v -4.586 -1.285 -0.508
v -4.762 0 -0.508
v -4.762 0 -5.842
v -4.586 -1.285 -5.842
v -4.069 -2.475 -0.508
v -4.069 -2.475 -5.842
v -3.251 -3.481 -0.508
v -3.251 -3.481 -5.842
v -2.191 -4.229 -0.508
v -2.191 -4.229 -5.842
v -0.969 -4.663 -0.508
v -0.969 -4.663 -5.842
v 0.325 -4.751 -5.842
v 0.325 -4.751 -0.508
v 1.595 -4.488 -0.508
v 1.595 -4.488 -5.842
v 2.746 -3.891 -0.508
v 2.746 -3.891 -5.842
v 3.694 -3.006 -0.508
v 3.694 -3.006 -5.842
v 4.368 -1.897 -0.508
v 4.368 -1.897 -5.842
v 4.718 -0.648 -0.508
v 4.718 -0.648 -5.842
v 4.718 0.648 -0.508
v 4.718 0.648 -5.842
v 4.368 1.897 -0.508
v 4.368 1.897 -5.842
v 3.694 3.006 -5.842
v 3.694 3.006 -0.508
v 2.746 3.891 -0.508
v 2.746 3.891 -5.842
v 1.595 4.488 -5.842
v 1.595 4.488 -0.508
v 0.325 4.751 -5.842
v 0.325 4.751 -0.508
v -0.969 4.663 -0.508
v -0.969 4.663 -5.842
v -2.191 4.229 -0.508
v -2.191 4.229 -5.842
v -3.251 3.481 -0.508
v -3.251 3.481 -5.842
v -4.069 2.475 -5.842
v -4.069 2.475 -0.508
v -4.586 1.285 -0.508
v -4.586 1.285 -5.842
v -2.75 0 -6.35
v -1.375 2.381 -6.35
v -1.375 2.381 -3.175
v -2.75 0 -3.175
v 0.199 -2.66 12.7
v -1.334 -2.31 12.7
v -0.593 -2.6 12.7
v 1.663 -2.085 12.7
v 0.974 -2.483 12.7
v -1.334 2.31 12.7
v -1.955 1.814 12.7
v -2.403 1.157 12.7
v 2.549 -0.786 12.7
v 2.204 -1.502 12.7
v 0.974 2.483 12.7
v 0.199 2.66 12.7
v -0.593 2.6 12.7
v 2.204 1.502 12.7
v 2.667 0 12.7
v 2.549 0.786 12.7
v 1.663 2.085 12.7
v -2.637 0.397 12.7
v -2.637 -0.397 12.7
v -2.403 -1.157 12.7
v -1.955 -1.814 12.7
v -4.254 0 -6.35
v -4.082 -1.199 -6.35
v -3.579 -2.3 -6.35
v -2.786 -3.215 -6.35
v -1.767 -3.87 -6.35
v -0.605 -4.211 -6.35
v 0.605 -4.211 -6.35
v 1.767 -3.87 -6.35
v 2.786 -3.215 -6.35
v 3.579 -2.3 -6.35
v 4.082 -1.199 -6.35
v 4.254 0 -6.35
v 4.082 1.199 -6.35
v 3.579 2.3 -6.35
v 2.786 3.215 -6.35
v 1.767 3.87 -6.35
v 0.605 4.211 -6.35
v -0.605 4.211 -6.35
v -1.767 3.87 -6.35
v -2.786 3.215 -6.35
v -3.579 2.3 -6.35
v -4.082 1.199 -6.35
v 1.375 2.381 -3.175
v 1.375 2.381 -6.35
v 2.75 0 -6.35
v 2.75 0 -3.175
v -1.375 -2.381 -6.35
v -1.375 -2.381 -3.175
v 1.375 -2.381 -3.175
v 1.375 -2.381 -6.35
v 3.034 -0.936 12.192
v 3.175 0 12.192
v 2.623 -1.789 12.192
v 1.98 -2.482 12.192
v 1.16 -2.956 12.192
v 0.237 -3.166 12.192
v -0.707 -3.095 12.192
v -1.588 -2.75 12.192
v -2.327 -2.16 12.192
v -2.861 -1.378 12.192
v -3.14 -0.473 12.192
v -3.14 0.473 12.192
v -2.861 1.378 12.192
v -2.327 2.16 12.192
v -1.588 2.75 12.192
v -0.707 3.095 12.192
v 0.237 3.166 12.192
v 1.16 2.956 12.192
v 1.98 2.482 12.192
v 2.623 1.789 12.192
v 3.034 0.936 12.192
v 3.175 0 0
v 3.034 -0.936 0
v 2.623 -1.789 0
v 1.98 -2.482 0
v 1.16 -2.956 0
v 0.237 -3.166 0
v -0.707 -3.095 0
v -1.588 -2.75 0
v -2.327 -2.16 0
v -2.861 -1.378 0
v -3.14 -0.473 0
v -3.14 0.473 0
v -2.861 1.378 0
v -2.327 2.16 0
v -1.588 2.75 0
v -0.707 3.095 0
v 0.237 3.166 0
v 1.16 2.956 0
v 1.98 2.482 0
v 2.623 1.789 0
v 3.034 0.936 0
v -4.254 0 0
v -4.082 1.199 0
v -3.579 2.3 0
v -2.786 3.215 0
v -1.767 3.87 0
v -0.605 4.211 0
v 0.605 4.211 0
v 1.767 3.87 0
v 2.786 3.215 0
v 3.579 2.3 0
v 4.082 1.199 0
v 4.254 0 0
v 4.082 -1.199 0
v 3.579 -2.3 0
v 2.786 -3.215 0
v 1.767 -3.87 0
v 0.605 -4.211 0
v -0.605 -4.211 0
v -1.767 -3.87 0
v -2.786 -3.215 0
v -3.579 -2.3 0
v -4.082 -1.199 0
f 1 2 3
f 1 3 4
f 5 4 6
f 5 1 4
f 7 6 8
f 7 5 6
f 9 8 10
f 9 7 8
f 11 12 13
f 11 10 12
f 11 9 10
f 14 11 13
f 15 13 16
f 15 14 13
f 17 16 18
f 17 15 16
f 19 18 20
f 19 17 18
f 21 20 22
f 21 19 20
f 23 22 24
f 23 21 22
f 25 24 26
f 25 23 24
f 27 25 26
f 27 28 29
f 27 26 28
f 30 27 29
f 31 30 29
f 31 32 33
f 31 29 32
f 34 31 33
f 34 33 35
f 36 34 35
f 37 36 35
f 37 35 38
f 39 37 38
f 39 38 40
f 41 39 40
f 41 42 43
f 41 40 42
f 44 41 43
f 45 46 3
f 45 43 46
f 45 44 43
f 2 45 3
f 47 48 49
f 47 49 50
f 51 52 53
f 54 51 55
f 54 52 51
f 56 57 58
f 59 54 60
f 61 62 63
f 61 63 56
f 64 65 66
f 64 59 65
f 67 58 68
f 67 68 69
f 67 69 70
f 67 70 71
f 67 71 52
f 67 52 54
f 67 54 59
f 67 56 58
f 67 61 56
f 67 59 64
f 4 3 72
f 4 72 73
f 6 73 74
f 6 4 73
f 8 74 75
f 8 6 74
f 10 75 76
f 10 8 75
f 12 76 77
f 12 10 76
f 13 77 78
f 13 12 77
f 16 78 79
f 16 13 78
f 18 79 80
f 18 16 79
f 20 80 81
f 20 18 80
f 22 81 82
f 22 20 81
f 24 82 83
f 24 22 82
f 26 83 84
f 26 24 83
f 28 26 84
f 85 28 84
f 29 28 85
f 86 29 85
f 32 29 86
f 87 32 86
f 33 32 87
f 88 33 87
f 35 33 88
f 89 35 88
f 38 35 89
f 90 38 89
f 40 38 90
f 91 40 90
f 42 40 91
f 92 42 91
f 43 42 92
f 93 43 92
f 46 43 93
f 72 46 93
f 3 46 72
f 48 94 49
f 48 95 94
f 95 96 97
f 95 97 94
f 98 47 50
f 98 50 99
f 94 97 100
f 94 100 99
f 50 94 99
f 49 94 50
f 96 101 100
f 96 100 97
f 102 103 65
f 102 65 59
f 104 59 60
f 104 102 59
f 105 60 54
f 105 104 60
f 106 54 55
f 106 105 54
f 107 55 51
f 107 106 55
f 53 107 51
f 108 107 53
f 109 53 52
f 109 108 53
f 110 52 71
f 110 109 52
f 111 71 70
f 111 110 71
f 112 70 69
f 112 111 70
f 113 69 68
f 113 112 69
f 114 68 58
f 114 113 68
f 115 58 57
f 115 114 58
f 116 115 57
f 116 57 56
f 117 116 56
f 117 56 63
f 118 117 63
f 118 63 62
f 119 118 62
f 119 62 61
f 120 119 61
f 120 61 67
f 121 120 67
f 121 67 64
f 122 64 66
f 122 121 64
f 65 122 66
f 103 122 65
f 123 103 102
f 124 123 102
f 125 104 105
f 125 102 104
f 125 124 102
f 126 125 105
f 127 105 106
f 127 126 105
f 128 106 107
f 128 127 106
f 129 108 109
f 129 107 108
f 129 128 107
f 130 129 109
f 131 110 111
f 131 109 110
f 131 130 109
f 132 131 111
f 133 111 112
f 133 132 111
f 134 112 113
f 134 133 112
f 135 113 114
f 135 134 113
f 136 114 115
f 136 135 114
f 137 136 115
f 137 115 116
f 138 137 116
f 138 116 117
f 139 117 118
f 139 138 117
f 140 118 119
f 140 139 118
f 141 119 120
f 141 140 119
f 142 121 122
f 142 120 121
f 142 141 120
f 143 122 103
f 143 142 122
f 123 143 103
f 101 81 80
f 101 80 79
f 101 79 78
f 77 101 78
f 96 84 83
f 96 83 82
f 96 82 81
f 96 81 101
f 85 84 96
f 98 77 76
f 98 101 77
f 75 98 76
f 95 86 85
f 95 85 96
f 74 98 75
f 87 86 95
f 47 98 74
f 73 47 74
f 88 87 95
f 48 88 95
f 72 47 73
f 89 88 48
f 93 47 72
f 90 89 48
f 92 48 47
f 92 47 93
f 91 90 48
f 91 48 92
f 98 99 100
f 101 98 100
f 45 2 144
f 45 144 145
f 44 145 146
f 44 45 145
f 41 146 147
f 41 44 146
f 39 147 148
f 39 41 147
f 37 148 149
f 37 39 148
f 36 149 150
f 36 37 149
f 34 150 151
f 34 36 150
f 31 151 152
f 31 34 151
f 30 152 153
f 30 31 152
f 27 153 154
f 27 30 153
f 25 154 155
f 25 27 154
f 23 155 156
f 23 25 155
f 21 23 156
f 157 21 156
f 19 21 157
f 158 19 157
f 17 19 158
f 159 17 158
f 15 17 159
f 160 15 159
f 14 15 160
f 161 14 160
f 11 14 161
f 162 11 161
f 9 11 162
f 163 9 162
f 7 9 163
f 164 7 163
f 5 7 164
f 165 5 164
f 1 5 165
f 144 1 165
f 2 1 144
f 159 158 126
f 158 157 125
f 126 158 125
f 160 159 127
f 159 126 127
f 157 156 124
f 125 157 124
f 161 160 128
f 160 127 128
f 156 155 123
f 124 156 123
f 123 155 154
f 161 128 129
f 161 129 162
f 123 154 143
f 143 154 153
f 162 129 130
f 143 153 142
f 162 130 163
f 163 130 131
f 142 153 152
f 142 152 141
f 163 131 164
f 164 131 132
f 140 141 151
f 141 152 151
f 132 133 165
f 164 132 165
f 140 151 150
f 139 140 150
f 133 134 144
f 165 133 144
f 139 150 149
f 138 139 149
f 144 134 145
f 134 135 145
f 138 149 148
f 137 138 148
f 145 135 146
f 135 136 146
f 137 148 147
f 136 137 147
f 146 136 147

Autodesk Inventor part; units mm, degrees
ref_plane "YZ Plane" through (0, 0, 0) normal (1, 0, 0) x (0, 1, 0)
ref_plane "XZ Plane" through (0, 0, 0) normal (0, 1, 0) x (-1, 0, 0)
ref_plane "XY Plane" through (0, 0, 0) normal (0, 0, 1) x (1, 0, 0)
sketch "Sketch1" plane through (0, 0, 0) normal (0, 0, 1) x (1, 0, 0)
  circle A0 centre (0, 0) radius 3.175
  dimension "d0" = 6.35
extrude "Extrusion1" add sketch "Sketch1" along normal blind 12.7
sketch "Sketch2" plane through (0, 0, 0) normal (0, 0, -1) x (-1, 0, 0)
  circle A0 centre (0, 0) radius 3.175 projected
  circle A1 centre (0, 0) radius 4.7625
  dimension "d3" = 9.525
extrude "Extrusion2" add sketch "Sketch2" along normal blind 6.35 contours A0 | A1
sketch "Sketch3" plane through (0, 0, -6.35) normal (0, 0, -1) x (-1, 0, 0)
  circle A0 centre (0, 0) radius 4.7625 projected
  line L0 (-1.3748, 2.3812) -> (1.3748, 2.3813)
  line L1 (1.3748, 2.3813) -> (2.7496, 0)
  line L2 (2.7496, 0) -> (1.3748, -2.3812)
  line L3 (1.3748, -2.3812) -> (-1.3748, -2.3812)
  line L4 (-1.3748, -2.3812) -> (-2.7496, 0)
  line L5 (-2.7496, 0) -> (-1.3748, 2.3812)
  dimension "d6" = 4.7625
extrude "Extrusion3" cut sketch "Sketch3" against normal blind 3.175 contours L0 L1 L2 L3 L4 L5
chamfer "Chamfer1" distance 0.508 angle 45 3 edges at (-3.175, 0, 12.7) (4.7625, 0, 0) (4.7625, 0, -6.35)
thread "Thread1" size "1/4-20 UNC" class "2A" standard "ANSI Unified Screw Threads" full length
properties part number "14-20 x750" material "Steel"
